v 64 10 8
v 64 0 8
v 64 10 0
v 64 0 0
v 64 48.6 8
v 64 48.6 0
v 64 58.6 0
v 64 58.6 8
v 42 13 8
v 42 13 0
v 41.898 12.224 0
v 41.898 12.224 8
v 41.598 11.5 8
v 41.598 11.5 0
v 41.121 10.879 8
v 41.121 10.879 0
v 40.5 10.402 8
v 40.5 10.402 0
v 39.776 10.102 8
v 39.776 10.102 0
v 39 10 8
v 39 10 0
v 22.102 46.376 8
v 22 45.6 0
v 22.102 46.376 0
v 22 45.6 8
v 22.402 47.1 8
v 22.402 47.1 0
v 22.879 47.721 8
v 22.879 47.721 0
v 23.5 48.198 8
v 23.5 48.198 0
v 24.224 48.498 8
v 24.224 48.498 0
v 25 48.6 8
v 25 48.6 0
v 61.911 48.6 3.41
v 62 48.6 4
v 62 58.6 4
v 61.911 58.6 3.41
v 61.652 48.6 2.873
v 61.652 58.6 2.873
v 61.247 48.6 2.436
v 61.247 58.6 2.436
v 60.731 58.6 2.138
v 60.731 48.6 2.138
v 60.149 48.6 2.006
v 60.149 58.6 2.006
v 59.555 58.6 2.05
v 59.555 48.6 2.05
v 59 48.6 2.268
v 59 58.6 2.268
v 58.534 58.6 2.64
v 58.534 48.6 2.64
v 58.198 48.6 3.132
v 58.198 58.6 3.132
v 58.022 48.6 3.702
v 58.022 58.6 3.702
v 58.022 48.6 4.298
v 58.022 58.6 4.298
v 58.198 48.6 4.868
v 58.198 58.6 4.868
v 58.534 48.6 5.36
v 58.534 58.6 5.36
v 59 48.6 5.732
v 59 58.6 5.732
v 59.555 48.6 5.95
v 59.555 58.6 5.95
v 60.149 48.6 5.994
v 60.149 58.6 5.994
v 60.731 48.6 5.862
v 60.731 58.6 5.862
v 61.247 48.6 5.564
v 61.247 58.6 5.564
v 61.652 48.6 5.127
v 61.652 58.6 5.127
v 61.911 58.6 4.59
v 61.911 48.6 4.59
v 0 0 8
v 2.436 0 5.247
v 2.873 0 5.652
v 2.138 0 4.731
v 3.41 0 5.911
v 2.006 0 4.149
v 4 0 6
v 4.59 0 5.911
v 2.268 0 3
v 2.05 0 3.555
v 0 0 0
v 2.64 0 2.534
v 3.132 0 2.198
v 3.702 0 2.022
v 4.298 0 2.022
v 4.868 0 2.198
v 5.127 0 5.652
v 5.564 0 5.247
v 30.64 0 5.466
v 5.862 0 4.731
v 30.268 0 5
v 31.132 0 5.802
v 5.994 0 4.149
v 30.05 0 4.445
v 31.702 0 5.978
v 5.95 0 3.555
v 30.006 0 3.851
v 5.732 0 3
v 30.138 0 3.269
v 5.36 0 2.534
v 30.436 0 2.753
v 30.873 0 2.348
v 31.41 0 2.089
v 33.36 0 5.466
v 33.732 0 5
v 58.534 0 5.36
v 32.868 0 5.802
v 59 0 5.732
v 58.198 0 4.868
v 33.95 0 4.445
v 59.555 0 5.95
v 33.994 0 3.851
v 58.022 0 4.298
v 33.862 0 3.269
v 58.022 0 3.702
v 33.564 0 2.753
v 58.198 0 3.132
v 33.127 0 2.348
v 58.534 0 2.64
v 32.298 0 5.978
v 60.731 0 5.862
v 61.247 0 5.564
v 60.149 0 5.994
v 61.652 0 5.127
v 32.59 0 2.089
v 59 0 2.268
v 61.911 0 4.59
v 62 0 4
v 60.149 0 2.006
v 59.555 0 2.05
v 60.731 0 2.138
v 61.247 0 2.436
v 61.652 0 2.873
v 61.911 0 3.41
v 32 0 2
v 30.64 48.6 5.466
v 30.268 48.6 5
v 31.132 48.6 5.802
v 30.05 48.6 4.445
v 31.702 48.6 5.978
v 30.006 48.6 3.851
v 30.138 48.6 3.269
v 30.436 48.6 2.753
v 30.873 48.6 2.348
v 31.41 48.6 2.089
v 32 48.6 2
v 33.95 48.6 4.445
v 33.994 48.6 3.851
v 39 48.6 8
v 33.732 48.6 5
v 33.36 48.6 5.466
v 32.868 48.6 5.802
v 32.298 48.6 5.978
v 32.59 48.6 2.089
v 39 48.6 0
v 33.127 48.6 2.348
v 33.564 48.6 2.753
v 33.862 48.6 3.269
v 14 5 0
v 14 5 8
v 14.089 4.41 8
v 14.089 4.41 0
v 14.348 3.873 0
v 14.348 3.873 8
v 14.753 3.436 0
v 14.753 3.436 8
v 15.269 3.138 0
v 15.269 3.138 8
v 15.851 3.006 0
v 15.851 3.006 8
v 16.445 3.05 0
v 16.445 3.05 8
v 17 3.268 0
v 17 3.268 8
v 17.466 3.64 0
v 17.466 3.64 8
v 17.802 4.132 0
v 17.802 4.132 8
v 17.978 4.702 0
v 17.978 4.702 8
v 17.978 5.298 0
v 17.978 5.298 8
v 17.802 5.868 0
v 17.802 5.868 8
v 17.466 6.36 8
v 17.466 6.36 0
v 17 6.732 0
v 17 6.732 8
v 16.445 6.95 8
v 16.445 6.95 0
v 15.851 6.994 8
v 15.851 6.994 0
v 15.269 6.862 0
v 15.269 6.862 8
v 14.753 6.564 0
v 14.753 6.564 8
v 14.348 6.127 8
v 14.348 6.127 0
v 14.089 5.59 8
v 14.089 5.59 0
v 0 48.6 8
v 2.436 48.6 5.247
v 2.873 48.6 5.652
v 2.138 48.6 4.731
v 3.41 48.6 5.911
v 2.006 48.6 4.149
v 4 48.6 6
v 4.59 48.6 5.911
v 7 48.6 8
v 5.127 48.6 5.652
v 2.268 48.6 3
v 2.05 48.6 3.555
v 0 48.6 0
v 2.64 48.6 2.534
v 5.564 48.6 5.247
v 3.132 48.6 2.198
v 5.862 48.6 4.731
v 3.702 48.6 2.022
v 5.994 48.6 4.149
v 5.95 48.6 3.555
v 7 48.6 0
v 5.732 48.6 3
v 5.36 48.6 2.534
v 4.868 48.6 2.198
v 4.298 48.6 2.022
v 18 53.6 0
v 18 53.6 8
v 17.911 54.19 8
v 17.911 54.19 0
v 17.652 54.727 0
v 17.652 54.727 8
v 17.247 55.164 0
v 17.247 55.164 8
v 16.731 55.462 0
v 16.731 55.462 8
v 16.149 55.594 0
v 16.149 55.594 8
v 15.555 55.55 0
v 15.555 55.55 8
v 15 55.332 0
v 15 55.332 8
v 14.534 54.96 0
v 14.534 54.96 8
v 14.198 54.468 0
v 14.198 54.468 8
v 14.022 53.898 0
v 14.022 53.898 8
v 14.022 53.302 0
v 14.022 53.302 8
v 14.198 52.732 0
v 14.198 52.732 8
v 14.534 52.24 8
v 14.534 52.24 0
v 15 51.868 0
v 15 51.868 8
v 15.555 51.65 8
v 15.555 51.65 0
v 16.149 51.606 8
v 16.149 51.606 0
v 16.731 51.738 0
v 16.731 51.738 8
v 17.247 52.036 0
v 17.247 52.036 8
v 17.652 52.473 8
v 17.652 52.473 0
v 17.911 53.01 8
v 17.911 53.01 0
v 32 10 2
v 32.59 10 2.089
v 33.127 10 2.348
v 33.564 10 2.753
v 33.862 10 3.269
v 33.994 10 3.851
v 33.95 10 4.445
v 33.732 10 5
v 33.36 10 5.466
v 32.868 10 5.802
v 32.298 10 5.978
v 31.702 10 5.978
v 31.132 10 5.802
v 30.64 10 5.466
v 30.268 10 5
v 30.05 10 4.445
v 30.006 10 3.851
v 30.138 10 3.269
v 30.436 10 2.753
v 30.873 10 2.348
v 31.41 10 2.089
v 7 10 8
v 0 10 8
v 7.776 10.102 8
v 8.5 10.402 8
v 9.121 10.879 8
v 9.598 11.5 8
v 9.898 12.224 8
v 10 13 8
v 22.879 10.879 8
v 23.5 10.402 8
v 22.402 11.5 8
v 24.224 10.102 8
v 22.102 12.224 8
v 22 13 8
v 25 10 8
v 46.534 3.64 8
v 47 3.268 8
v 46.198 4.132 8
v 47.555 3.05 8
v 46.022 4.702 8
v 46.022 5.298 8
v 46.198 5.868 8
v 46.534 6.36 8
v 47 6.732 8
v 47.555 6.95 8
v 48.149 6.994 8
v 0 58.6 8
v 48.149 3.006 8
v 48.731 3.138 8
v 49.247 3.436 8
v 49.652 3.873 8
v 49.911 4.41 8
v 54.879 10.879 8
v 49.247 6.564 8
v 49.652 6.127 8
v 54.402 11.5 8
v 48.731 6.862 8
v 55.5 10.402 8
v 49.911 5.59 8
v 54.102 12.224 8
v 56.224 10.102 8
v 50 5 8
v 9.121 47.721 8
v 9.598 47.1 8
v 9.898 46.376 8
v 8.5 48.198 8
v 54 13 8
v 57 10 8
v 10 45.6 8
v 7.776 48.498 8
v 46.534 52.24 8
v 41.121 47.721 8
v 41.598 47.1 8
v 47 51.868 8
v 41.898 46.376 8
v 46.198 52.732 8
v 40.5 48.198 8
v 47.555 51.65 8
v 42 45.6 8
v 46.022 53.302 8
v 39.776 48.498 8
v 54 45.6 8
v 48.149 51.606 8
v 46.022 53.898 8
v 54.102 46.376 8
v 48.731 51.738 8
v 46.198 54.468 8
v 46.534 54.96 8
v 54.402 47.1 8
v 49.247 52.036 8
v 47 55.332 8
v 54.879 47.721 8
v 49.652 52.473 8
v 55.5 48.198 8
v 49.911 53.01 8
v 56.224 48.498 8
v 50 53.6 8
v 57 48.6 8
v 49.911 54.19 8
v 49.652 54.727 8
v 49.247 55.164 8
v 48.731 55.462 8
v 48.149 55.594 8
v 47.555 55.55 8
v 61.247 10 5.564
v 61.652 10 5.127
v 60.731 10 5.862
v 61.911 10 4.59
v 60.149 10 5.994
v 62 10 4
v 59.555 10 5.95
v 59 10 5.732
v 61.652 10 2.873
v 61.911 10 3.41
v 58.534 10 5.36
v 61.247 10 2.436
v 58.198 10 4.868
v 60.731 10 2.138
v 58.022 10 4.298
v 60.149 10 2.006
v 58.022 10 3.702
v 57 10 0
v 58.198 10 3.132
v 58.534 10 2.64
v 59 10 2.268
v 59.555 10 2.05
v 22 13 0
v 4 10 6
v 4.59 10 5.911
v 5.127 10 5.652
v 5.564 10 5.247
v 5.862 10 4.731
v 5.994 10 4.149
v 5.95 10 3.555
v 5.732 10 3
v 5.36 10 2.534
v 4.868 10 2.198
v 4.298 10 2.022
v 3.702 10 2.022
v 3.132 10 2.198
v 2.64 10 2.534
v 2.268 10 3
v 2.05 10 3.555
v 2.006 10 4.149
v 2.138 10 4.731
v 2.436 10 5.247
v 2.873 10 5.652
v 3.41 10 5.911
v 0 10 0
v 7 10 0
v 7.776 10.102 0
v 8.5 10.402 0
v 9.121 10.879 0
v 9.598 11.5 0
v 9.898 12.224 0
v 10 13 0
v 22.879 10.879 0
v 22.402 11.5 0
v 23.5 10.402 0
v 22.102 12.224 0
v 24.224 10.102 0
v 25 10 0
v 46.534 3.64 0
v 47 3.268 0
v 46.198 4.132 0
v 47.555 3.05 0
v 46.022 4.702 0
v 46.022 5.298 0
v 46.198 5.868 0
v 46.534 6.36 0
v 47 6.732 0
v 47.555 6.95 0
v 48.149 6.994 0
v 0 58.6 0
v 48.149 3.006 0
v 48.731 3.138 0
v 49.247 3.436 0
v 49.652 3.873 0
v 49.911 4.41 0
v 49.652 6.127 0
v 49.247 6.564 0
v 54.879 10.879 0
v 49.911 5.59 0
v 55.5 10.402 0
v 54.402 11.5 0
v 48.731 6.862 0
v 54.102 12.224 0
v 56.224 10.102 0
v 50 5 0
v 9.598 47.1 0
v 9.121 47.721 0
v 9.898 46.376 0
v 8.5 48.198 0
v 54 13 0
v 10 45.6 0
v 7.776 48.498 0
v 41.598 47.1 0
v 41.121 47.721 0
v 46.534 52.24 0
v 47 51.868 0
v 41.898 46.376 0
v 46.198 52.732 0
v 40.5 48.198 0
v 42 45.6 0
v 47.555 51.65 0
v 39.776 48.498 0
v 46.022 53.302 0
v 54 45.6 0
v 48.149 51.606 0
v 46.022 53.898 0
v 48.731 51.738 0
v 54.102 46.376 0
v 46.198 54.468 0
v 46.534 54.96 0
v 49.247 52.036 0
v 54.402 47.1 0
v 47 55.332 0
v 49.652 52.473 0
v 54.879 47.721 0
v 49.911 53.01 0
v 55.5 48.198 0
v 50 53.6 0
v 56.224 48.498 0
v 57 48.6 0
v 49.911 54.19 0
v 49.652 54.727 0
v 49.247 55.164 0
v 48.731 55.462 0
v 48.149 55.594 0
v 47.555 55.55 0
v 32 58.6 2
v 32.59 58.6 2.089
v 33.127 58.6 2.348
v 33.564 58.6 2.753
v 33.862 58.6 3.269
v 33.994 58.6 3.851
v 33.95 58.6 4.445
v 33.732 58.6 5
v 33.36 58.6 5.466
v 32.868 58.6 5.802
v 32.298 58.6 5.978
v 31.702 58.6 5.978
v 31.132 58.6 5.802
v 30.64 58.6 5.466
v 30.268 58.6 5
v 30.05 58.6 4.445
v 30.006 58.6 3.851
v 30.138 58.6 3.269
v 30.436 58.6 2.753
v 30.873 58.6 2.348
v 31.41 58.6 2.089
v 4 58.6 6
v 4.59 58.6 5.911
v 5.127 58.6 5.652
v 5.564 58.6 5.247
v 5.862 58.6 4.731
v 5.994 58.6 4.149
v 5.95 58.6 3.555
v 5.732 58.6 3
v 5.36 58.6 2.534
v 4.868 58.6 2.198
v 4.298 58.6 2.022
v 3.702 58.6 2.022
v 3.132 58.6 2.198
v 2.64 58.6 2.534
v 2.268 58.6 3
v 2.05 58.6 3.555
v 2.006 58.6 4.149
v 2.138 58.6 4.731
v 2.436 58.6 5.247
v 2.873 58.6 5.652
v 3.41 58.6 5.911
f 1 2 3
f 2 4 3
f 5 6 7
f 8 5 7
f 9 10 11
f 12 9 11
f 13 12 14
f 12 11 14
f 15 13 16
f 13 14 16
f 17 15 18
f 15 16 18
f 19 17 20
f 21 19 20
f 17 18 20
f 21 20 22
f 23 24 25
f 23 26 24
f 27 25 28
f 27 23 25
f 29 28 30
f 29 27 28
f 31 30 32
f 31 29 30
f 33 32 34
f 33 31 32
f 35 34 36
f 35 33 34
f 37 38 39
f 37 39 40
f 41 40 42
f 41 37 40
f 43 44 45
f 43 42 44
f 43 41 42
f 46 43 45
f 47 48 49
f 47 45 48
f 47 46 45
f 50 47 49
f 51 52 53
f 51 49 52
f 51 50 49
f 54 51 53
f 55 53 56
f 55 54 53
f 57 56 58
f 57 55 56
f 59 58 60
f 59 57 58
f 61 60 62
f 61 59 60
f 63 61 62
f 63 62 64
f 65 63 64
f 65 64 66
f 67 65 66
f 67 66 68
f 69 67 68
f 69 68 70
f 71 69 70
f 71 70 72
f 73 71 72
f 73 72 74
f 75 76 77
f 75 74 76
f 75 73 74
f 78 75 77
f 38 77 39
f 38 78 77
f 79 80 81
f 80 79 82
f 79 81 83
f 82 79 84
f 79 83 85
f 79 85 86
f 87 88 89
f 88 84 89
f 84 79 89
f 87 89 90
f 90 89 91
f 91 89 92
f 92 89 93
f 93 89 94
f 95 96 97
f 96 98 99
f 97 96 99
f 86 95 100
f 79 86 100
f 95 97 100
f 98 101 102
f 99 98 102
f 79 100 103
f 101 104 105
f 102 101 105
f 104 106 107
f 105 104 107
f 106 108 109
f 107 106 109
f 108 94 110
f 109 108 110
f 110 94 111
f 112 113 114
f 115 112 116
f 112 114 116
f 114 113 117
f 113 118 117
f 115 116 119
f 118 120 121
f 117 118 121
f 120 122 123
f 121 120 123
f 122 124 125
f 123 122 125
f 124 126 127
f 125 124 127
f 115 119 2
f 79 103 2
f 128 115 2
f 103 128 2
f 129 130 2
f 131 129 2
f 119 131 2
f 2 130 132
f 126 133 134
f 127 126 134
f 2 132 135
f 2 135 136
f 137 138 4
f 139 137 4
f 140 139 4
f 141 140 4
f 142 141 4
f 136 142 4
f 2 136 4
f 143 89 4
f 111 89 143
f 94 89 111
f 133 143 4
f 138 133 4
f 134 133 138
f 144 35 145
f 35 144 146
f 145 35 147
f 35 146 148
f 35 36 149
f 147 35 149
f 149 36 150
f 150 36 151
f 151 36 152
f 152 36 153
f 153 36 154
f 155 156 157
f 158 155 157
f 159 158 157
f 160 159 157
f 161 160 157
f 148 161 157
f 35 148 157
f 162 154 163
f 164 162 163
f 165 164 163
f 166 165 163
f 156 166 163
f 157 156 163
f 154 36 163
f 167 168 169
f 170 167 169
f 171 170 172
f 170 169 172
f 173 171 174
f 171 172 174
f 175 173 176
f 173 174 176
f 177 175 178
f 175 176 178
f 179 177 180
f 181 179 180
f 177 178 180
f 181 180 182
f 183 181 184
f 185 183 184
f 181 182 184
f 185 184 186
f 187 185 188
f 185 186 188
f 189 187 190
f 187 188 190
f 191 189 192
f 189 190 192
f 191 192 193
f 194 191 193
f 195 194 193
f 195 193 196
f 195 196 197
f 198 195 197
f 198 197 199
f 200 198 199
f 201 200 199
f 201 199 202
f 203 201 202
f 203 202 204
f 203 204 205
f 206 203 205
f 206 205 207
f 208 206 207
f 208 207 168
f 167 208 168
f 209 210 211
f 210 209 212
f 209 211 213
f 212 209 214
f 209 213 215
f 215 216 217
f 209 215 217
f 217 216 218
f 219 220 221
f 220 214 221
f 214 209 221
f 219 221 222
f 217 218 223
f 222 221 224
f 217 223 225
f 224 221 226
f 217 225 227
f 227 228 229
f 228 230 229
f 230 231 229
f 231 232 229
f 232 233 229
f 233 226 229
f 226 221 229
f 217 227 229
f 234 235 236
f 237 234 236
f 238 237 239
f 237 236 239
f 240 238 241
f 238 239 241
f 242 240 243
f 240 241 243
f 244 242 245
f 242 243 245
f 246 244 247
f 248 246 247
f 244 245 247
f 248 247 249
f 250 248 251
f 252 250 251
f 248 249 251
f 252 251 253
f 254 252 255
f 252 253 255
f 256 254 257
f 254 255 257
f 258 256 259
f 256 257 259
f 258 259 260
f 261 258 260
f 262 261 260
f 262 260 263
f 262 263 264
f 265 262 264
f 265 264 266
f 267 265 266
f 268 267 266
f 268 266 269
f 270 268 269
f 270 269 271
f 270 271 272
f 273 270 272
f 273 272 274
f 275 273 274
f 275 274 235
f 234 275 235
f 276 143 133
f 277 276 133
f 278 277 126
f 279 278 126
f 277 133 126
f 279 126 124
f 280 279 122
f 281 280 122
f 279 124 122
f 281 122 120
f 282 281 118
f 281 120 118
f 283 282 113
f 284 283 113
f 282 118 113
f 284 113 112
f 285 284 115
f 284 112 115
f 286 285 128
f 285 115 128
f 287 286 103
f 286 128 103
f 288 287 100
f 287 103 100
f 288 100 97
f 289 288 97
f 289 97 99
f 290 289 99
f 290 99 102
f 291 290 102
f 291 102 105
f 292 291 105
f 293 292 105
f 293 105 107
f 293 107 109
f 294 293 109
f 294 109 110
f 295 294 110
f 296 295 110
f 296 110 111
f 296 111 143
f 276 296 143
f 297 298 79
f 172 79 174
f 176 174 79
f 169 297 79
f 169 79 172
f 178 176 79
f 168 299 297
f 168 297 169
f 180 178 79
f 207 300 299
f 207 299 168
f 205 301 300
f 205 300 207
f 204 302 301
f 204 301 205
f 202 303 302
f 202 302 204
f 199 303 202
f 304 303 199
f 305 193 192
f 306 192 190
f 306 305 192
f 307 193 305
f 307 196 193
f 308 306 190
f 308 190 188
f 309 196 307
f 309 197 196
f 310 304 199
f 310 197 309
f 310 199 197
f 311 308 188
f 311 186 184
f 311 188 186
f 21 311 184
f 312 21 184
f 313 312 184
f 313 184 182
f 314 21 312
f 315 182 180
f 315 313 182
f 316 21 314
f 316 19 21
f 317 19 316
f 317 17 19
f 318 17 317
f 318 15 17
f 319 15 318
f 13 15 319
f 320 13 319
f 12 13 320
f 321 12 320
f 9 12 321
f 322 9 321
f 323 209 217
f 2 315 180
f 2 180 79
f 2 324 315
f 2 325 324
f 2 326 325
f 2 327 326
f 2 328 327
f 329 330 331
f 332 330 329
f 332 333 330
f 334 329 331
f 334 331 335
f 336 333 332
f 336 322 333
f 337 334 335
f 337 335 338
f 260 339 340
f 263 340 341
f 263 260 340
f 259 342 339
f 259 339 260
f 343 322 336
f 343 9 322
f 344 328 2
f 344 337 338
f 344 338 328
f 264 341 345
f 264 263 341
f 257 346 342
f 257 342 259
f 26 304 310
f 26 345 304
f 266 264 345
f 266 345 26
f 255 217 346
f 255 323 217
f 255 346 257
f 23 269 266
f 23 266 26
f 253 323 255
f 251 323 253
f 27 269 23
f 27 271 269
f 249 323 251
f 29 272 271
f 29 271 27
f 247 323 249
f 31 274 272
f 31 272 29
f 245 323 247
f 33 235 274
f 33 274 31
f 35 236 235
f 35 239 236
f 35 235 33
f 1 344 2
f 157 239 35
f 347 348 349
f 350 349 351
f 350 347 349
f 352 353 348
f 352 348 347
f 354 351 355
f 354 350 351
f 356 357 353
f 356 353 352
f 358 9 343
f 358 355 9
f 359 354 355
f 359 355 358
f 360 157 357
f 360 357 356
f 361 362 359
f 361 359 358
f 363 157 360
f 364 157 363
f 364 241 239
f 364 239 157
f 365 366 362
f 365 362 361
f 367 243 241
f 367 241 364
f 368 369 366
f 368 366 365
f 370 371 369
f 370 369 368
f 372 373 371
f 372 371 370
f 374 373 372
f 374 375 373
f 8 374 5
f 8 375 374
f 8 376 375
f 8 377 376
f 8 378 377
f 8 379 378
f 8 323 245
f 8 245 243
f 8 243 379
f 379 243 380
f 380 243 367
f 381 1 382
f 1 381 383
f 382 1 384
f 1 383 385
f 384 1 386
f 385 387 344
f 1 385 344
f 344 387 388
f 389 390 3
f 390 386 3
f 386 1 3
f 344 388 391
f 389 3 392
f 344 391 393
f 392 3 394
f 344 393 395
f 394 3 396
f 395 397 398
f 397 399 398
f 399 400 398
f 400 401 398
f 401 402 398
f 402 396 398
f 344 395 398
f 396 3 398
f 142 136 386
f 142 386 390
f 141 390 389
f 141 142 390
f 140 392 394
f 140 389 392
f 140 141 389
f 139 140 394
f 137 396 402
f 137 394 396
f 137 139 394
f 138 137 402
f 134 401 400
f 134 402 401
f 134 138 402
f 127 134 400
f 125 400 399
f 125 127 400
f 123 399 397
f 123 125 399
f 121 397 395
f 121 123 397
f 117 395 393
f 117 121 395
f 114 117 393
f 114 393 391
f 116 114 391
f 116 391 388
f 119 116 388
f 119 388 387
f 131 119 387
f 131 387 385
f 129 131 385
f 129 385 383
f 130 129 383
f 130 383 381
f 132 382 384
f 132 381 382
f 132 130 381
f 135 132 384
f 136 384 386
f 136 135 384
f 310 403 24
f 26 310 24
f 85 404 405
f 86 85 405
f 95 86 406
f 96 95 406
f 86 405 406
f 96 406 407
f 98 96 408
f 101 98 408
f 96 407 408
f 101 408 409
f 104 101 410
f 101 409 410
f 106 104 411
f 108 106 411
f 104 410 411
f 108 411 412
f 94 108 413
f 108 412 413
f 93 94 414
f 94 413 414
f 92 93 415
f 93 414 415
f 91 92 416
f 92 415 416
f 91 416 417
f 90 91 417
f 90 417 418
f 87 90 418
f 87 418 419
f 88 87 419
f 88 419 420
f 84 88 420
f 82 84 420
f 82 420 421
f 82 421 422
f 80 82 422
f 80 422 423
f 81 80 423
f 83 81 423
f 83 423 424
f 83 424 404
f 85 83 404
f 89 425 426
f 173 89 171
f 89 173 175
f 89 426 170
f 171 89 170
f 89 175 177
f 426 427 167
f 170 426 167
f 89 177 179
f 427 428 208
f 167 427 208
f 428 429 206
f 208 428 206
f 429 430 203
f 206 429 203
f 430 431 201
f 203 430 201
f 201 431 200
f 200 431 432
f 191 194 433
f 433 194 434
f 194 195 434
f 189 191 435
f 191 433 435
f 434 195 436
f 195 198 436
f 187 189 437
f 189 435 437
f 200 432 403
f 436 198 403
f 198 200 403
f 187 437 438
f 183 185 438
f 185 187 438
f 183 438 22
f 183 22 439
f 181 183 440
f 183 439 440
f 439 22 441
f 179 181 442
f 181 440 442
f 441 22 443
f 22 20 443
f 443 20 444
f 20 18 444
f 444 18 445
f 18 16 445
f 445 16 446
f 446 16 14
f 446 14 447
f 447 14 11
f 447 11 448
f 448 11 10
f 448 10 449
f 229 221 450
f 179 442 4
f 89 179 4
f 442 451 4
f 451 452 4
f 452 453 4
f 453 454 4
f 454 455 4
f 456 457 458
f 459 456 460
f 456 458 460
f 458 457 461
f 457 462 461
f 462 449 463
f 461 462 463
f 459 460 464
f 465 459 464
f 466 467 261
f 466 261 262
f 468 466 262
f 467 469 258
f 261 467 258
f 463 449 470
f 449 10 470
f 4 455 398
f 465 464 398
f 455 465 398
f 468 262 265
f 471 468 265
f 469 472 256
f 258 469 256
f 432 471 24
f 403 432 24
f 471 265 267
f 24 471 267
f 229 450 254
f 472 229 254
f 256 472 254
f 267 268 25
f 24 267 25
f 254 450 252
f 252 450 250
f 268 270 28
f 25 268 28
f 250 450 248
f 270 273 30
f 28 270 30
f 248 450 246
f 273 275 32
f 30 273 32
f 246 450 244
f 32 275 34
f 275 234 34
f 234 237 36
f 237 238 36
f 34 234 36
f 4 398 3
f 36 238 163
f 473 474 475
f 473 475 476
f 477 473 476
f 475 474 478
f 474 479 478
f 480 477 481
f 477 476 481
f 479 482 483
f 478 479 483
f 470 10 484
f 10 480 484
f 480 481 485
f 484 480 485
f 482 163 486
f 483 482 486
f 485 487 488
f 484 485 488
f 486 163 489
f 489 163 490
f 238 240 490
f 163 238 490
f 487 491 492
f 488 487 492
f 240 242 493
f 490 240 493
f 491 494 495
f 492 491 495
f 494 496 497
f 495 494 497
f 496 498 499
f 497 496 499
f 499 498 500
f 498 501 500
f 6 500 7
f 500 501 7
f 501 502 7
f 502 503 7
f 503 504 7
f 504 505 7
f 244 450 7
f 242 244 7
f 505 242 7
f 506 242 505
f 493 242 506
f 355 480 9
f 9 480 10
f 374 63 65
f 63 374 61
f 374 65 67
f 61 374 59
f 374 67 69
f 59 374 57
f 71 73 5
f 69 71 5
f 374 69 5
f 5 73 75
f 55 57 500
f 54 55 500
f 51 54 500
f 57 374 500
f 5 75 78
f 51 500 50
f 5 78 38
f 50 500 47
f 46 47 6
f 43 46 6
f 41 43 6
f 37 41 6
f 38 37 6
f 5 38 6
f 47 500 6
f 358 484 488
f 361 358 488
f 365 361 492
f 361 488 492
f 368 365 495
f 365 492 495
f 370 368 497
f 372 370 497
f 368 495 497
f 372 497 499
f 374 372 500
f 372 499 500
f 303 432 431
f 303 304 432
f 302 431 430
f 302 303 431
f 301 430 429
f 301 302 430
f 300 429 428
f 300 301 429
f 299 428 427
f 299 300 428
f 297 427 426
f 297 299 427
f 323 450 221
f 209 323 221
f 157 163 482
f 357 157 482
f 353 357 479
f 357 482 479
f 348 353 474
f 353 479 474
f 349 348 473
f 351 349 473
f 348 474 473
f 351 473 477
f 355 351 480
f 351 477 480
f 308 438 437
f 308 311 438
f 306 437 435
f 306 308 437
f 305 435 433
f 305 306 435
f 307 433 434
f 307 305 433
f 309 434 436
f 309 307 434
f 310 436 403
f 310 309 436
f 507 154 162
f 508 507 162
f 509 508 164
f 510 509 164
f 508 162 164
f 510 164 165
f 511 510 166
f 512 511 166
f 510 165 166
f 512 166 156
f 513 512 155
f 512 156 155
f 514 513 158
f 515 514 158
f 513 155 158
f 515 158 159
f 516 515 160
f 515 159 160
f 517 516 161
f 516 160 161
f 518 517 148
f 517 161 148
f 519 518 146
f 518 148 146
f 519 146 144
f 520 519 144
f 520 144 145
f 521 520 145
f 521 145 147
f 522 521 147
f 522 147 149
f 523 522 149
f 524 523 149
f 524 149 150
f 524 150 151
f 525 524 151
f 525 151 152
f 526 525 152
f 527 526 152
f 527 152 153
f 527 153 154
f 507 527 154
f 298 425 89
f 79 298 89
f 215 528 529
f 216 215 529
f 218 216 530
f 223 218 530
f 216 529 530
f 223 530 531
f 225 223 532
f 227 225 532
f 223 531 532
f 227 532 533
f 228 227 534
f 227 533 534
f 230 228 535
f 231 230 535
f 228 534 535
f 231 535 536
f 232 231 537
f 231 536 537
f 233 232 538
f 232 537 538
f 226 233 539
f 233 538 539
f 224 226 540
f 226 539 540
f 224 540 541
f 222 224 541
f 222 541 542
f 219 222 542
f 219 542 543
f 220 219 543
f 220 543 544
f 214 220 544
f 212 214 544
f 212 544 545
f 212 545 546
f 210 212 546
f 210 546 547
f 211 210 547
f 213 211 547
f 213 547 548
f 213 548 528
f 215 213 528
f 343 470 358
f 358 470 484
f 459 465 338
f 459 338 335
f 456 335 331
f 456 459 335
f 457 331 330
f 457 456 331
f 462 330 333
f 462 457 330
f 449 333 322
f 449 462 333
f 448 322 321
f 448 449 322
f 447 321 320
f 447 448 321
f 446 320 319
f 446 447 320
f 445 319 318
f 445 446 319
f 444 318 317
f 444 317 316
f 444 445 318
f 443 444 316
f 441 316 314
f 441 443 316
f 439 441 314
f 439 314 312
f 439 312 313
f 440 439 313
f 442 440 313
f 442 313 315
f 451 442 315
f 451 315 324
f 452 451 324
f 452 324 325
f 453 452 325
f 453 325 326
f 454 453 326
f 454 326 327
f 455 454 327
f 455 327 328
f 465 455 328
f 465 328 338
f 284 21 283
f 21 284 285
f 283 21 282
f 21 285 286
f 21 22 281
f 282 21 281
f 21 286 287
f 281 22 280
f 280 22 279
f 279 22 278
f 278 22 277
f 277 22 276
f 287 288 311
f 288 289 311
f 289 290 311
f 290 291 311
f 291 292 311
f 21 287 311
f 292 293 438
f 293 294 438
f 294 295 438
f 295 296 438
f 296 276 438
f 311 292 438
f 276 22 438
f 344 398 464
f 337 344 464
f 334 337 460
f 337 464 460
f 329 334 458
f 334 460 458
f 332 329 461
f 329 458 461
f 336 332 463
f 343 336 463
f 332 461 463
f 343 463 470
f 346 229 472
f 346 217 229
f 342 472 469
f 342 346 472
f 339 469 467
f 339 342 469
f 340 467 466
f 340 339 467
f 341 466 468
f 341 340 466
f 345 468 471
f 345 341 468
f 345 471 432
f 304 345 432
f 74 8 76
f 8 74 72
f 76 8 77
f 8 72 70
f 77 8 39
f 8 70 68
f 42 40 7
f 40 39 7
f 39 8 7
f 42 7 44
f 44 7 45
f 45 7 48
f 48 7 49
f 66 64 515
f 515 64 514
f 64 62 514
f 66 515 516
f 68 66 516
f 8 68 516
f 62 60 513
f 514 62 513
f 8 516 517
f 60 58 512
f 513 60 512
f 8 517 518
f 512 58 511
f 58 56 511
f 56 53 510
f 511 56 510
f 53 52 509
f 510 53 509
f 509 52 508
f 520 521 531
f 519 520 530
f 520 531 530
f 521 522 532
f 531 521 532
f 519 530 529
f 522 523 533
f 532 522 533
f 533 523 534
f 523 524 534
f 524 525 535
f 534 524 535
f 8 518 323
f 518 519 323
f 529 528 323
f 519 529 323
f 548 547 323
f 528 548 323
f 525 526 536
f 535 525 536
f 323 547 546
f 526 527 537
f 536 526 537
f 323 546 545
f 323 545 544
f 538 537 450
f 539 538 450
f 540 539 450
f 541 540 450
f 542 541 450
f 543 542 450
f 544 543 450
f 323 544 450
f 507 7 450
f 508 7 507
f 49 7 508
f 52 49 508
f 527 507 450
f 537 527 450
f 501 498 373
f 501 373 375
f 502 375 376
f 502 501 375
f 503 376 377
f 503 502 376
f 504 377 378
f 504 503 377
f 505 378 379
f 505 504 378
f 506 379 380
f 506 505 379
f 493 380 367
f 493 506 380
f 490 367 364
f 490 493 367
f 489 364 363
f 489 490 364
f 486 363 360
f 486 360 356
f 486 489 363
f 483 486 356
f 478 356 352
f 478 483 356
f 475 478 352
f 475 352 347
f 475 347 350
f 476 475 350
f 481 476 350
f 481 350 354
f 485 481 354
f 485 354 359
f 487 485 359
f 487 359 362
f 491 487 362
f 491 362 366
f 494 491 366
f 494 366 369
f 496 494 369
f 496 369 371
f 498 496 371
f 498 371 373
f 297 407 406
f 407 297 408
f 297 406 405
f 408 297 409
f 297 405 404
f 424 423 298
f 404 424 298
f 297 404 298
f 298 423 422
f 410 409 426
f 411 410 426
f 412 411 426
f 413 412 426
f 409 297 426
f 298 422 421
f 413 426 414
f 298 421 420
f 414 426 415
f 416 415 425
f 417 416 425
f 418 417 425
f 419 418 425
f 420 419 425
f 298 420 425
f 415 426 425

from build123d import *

# Parameters (mm, degrees)
EXTRUDE_1_DEPTH      = 8
FILLET_1_R           = 3
SKETCH_3_R           = 2
CUT_EXTRUDE_1_DEPTH  = 60
SKETCH_4_R           = 2
CUT_EXTRUDE_2_DEPTH  = 50
MIRROR_1_OUTLINE_R   = 2
MIRROR_1_DEPTH       = 1.9999999
MIRROR_START         = 6.0000001
MIRROR_1_2_OUTLINE_R = 2
MIRROR_1_2_DEPTH     = 1.9999999
MIRROR_START_2       = 1.9999999
MIRROR_1_3_OUTLINE_R = 2
MIRROR_1_3_DEPTH     = 4.0000002
MIRROR_START_3       = -1
MIRROR_1_4_OUTLINE_R = 2
MIRROR_1_4_DEPTH     = 61
SKETCH_5_R           = 2
CUT_EXTRUDE_3_DEPTH  = 100


with BuildPart() as part:
    # 草图1 → 凸台-拉伸1 (new body)
    with BuildSketch(Plane.XY):
        Polygon((0, 0), (32, 0), (32, 10), (22, 10), (22, 48.6), (32, 48.6), (32, 58.6), (0, 58.6), (0, 48.6), (10, 48.6), (10, 10), (0, 10), align=None)
    extrude(amount=EXTRUDE_1_DEPTH)

    # 圆角1
    fillet_1_edges = [part.edges().sort_by_distance(p)[0] for p in [
        (10, 10, 4),
        (10, 48.6, 4),
        (22, 48.6, 4),
        (22, 10, 4),
    ]]
    fillet(fillet_1_edges, radius=FILLET_1_R)

    # 草图3 → 切除-拉伸1 (cut)
    with BuildSketch(Plane(origin=(0, 58.6, 0), x_dir=(1, 0, 0), z_dir=(0, 1, 0))):
        with Locations(Location((4, -4, 0), (0, 0, 270))):
            Circle(SKETCH_3_R)
    extrude(amount=-CUT_EXTRUDE_1_DEPTH, mode=Mode.SUBTRACT)

    # 草图4 → 切除-拉伸2 (cut)
    with BuildSketch(Plane.XY.offset(8)):
        with Locations((16, 53.6)):
            Circle(SKETCH_4_R)
        with Locations(Location((16, 5, 0), (0, 0, 180))):
            Circle(SKETCH_4_R)
    extrude(amount=-CUT_EXTRUDE_2_DEPTH, mode=Mode.SUBTRACT)

    # 镜向1: read off the stored shape, not the designer's step
    # 镜向1 outline → 镜向1 (add)
    with BuildSketch(Plane.XY):
        with BuildLine():
            Line((32, 0), (64, 0))
            Line((64, 0), (64, 10))
            Line((64, 10), (57, 10))
            ThreePointArc((57, 10), (54.878679656, 10.878679656), (54, 13))
            Line((54, 13), (54, 45.6))
            ThreePointArc((54, 45.6), (54.878679656, 47.721320344), (57, 48.6))
            Line((57, 48.6), (64, 48.6))
            Line((64, 48.6), (64, 58.6))
            Line((64, 58.6), (32, 58.6))
            Line((32, 58.6), (32, 48.6))
            Line((32, 48.6), (39, 48.6))
            ThreePointArc((39, 48.6), (41.121320344, 47.721320344), (42, 45.6))
            Line((42, 45.6), (42, 13))
            ThreePointArc((42, 13), (41.121320344, 10.878679656), (39, 10))
            Line((39, 10), (32, 10))
            Line((32, 10), (32, 0))
        make_face()
        with Locations((48, 5)):
            Circle(MIRROR_1_OUTLINE_R, mode=Mode.SUBTRACT)
        with Locations((48, 53.6)):
            Circle(MIRROR_1_OUTLINE_R, mode=Mode.SUBTRACT)
    extrude(amount=MIRROR_1_DEPTH)

    # Mirror 1 2 outline → Mirror 1 2 (add)
    with BuildSketch(Plane.XY.offset(MIRROR_START)):
        with BuildLine():
            Line((32, 0), (64, 0))
            Line((64, 0), (64, 10))
            Line((64, 10), (57, 10))
            ThreePointArc((57, 10), (54.878679656, 10.878679656), (54, 13))
            Line((54, 13), (54, 45.6))
            ThreePointArc((54, 45.6), (54.878679656, 47.721320344), (57, 48.6))
            Line((57, 48.6), (64, 48.6))
            Line((64, 48.6), (64, 58.6))
            Line((64, 58.6), (32, 58.6))
            Line((32, 58.6), (32, 48.6))
            Line((32, 48.6), (39, 48.6))
            ThreePointArc((39, 48.6), (41.121320344, 47.721320344), (42, 45.6))
            Line((42, 45.6), (42, 13))
            ThreePointArc((42, 13), (41.121320344, 10.878679656), (39, 10))
            Line((39, 10), (32, 10))
            Line((32, 10), (32, 0))
        make_face()
        with Locations((48, 5)):
            Circle(MIRROR_1_2_OUTLINE_R, mode=Mode.SUBTRACT)
        with Locations((48, 53.6)):
            Circle(MIRROR_1_2_OUTLINE_R, mode=Mode.SUBTRACT)
    extrude(amount=MIRROR_1_2_DEPTH)

    # Mirror 1 3 outline → Mirror 1 3 (add)
    with BuildSketch(Plane.XY.offset(MIRROR_START_2)):
        with BuildLine():
            Line((32, 0), (64, 0))
            Line((64, 0), (64, 10))
            Line((64, 10), (57, 10))
            ThreePointArc((57, 10), (54.878679656, 10.878679656), (54, 13))
            Line((54, 13), (54, 45.6))
            ThreePointArc((54, 45.6), (54.878679656, 47.721320344), (57, 48.6))
            Line((57, 48.6), (64, 48.6))
            Line((64, 48.6), (64, 58.6))
            Line((64, 58.6), (32, 58.6))
            Line((32, 58.6), (32, 48.6))
            Line((32, 48.6), (39, 48.6))
            ThreePointArc((39, 48.6), (41.121320344, 47.721320344), (42, 45.6))
            Line((42, 45.6), (42, 13))
            ThreePointArc((42, 13), (41.121320344, 10.878679656), (39, 10))
            Line((39, 10), (32, 10))
            Line((32, 10), (32, 0))
        make_face()
        with Locations((48, 5)):
            Circle(MIRROR_1_3_OUTLINE_R, mode=Mode.SUBTRACT)
        with Locations((48, 53.6)):
            Circle(MIRROR_1_3_OUTLINE_R, mode=Mode.SUBTRACT)
    extrude(amount=MIRROR_1_3_DEPTH)

    # Mirror 1 4 outline → Mirror 1 4 (cut)
    with BuildSketch(Plane(origin=(0, 0, 0), x_dir=(1, 0, 0), z_dir=(0, 1, 0)).offset(MIRROR_START_3)):
        with Locations((60, -4)):
            Circle(MIRROR_1_4_OUTLINE_R)
    extrude(amount=MIRROR_1_4_DEPTH, mode=Mode.SUBTRACT)

    # 草图5 → 切除-拉伸3 (cut)
    with BuildSketch(Plane.XZ):
        with Locations(Location((32, 4, 0), (0, 0, 270))):
            Circle(SKETCH_5_R)
    extrude(amount=-CUT_EXTRUDE_3_DEPTH, mode=Mode.SUBTRACT)


solid = part.part
